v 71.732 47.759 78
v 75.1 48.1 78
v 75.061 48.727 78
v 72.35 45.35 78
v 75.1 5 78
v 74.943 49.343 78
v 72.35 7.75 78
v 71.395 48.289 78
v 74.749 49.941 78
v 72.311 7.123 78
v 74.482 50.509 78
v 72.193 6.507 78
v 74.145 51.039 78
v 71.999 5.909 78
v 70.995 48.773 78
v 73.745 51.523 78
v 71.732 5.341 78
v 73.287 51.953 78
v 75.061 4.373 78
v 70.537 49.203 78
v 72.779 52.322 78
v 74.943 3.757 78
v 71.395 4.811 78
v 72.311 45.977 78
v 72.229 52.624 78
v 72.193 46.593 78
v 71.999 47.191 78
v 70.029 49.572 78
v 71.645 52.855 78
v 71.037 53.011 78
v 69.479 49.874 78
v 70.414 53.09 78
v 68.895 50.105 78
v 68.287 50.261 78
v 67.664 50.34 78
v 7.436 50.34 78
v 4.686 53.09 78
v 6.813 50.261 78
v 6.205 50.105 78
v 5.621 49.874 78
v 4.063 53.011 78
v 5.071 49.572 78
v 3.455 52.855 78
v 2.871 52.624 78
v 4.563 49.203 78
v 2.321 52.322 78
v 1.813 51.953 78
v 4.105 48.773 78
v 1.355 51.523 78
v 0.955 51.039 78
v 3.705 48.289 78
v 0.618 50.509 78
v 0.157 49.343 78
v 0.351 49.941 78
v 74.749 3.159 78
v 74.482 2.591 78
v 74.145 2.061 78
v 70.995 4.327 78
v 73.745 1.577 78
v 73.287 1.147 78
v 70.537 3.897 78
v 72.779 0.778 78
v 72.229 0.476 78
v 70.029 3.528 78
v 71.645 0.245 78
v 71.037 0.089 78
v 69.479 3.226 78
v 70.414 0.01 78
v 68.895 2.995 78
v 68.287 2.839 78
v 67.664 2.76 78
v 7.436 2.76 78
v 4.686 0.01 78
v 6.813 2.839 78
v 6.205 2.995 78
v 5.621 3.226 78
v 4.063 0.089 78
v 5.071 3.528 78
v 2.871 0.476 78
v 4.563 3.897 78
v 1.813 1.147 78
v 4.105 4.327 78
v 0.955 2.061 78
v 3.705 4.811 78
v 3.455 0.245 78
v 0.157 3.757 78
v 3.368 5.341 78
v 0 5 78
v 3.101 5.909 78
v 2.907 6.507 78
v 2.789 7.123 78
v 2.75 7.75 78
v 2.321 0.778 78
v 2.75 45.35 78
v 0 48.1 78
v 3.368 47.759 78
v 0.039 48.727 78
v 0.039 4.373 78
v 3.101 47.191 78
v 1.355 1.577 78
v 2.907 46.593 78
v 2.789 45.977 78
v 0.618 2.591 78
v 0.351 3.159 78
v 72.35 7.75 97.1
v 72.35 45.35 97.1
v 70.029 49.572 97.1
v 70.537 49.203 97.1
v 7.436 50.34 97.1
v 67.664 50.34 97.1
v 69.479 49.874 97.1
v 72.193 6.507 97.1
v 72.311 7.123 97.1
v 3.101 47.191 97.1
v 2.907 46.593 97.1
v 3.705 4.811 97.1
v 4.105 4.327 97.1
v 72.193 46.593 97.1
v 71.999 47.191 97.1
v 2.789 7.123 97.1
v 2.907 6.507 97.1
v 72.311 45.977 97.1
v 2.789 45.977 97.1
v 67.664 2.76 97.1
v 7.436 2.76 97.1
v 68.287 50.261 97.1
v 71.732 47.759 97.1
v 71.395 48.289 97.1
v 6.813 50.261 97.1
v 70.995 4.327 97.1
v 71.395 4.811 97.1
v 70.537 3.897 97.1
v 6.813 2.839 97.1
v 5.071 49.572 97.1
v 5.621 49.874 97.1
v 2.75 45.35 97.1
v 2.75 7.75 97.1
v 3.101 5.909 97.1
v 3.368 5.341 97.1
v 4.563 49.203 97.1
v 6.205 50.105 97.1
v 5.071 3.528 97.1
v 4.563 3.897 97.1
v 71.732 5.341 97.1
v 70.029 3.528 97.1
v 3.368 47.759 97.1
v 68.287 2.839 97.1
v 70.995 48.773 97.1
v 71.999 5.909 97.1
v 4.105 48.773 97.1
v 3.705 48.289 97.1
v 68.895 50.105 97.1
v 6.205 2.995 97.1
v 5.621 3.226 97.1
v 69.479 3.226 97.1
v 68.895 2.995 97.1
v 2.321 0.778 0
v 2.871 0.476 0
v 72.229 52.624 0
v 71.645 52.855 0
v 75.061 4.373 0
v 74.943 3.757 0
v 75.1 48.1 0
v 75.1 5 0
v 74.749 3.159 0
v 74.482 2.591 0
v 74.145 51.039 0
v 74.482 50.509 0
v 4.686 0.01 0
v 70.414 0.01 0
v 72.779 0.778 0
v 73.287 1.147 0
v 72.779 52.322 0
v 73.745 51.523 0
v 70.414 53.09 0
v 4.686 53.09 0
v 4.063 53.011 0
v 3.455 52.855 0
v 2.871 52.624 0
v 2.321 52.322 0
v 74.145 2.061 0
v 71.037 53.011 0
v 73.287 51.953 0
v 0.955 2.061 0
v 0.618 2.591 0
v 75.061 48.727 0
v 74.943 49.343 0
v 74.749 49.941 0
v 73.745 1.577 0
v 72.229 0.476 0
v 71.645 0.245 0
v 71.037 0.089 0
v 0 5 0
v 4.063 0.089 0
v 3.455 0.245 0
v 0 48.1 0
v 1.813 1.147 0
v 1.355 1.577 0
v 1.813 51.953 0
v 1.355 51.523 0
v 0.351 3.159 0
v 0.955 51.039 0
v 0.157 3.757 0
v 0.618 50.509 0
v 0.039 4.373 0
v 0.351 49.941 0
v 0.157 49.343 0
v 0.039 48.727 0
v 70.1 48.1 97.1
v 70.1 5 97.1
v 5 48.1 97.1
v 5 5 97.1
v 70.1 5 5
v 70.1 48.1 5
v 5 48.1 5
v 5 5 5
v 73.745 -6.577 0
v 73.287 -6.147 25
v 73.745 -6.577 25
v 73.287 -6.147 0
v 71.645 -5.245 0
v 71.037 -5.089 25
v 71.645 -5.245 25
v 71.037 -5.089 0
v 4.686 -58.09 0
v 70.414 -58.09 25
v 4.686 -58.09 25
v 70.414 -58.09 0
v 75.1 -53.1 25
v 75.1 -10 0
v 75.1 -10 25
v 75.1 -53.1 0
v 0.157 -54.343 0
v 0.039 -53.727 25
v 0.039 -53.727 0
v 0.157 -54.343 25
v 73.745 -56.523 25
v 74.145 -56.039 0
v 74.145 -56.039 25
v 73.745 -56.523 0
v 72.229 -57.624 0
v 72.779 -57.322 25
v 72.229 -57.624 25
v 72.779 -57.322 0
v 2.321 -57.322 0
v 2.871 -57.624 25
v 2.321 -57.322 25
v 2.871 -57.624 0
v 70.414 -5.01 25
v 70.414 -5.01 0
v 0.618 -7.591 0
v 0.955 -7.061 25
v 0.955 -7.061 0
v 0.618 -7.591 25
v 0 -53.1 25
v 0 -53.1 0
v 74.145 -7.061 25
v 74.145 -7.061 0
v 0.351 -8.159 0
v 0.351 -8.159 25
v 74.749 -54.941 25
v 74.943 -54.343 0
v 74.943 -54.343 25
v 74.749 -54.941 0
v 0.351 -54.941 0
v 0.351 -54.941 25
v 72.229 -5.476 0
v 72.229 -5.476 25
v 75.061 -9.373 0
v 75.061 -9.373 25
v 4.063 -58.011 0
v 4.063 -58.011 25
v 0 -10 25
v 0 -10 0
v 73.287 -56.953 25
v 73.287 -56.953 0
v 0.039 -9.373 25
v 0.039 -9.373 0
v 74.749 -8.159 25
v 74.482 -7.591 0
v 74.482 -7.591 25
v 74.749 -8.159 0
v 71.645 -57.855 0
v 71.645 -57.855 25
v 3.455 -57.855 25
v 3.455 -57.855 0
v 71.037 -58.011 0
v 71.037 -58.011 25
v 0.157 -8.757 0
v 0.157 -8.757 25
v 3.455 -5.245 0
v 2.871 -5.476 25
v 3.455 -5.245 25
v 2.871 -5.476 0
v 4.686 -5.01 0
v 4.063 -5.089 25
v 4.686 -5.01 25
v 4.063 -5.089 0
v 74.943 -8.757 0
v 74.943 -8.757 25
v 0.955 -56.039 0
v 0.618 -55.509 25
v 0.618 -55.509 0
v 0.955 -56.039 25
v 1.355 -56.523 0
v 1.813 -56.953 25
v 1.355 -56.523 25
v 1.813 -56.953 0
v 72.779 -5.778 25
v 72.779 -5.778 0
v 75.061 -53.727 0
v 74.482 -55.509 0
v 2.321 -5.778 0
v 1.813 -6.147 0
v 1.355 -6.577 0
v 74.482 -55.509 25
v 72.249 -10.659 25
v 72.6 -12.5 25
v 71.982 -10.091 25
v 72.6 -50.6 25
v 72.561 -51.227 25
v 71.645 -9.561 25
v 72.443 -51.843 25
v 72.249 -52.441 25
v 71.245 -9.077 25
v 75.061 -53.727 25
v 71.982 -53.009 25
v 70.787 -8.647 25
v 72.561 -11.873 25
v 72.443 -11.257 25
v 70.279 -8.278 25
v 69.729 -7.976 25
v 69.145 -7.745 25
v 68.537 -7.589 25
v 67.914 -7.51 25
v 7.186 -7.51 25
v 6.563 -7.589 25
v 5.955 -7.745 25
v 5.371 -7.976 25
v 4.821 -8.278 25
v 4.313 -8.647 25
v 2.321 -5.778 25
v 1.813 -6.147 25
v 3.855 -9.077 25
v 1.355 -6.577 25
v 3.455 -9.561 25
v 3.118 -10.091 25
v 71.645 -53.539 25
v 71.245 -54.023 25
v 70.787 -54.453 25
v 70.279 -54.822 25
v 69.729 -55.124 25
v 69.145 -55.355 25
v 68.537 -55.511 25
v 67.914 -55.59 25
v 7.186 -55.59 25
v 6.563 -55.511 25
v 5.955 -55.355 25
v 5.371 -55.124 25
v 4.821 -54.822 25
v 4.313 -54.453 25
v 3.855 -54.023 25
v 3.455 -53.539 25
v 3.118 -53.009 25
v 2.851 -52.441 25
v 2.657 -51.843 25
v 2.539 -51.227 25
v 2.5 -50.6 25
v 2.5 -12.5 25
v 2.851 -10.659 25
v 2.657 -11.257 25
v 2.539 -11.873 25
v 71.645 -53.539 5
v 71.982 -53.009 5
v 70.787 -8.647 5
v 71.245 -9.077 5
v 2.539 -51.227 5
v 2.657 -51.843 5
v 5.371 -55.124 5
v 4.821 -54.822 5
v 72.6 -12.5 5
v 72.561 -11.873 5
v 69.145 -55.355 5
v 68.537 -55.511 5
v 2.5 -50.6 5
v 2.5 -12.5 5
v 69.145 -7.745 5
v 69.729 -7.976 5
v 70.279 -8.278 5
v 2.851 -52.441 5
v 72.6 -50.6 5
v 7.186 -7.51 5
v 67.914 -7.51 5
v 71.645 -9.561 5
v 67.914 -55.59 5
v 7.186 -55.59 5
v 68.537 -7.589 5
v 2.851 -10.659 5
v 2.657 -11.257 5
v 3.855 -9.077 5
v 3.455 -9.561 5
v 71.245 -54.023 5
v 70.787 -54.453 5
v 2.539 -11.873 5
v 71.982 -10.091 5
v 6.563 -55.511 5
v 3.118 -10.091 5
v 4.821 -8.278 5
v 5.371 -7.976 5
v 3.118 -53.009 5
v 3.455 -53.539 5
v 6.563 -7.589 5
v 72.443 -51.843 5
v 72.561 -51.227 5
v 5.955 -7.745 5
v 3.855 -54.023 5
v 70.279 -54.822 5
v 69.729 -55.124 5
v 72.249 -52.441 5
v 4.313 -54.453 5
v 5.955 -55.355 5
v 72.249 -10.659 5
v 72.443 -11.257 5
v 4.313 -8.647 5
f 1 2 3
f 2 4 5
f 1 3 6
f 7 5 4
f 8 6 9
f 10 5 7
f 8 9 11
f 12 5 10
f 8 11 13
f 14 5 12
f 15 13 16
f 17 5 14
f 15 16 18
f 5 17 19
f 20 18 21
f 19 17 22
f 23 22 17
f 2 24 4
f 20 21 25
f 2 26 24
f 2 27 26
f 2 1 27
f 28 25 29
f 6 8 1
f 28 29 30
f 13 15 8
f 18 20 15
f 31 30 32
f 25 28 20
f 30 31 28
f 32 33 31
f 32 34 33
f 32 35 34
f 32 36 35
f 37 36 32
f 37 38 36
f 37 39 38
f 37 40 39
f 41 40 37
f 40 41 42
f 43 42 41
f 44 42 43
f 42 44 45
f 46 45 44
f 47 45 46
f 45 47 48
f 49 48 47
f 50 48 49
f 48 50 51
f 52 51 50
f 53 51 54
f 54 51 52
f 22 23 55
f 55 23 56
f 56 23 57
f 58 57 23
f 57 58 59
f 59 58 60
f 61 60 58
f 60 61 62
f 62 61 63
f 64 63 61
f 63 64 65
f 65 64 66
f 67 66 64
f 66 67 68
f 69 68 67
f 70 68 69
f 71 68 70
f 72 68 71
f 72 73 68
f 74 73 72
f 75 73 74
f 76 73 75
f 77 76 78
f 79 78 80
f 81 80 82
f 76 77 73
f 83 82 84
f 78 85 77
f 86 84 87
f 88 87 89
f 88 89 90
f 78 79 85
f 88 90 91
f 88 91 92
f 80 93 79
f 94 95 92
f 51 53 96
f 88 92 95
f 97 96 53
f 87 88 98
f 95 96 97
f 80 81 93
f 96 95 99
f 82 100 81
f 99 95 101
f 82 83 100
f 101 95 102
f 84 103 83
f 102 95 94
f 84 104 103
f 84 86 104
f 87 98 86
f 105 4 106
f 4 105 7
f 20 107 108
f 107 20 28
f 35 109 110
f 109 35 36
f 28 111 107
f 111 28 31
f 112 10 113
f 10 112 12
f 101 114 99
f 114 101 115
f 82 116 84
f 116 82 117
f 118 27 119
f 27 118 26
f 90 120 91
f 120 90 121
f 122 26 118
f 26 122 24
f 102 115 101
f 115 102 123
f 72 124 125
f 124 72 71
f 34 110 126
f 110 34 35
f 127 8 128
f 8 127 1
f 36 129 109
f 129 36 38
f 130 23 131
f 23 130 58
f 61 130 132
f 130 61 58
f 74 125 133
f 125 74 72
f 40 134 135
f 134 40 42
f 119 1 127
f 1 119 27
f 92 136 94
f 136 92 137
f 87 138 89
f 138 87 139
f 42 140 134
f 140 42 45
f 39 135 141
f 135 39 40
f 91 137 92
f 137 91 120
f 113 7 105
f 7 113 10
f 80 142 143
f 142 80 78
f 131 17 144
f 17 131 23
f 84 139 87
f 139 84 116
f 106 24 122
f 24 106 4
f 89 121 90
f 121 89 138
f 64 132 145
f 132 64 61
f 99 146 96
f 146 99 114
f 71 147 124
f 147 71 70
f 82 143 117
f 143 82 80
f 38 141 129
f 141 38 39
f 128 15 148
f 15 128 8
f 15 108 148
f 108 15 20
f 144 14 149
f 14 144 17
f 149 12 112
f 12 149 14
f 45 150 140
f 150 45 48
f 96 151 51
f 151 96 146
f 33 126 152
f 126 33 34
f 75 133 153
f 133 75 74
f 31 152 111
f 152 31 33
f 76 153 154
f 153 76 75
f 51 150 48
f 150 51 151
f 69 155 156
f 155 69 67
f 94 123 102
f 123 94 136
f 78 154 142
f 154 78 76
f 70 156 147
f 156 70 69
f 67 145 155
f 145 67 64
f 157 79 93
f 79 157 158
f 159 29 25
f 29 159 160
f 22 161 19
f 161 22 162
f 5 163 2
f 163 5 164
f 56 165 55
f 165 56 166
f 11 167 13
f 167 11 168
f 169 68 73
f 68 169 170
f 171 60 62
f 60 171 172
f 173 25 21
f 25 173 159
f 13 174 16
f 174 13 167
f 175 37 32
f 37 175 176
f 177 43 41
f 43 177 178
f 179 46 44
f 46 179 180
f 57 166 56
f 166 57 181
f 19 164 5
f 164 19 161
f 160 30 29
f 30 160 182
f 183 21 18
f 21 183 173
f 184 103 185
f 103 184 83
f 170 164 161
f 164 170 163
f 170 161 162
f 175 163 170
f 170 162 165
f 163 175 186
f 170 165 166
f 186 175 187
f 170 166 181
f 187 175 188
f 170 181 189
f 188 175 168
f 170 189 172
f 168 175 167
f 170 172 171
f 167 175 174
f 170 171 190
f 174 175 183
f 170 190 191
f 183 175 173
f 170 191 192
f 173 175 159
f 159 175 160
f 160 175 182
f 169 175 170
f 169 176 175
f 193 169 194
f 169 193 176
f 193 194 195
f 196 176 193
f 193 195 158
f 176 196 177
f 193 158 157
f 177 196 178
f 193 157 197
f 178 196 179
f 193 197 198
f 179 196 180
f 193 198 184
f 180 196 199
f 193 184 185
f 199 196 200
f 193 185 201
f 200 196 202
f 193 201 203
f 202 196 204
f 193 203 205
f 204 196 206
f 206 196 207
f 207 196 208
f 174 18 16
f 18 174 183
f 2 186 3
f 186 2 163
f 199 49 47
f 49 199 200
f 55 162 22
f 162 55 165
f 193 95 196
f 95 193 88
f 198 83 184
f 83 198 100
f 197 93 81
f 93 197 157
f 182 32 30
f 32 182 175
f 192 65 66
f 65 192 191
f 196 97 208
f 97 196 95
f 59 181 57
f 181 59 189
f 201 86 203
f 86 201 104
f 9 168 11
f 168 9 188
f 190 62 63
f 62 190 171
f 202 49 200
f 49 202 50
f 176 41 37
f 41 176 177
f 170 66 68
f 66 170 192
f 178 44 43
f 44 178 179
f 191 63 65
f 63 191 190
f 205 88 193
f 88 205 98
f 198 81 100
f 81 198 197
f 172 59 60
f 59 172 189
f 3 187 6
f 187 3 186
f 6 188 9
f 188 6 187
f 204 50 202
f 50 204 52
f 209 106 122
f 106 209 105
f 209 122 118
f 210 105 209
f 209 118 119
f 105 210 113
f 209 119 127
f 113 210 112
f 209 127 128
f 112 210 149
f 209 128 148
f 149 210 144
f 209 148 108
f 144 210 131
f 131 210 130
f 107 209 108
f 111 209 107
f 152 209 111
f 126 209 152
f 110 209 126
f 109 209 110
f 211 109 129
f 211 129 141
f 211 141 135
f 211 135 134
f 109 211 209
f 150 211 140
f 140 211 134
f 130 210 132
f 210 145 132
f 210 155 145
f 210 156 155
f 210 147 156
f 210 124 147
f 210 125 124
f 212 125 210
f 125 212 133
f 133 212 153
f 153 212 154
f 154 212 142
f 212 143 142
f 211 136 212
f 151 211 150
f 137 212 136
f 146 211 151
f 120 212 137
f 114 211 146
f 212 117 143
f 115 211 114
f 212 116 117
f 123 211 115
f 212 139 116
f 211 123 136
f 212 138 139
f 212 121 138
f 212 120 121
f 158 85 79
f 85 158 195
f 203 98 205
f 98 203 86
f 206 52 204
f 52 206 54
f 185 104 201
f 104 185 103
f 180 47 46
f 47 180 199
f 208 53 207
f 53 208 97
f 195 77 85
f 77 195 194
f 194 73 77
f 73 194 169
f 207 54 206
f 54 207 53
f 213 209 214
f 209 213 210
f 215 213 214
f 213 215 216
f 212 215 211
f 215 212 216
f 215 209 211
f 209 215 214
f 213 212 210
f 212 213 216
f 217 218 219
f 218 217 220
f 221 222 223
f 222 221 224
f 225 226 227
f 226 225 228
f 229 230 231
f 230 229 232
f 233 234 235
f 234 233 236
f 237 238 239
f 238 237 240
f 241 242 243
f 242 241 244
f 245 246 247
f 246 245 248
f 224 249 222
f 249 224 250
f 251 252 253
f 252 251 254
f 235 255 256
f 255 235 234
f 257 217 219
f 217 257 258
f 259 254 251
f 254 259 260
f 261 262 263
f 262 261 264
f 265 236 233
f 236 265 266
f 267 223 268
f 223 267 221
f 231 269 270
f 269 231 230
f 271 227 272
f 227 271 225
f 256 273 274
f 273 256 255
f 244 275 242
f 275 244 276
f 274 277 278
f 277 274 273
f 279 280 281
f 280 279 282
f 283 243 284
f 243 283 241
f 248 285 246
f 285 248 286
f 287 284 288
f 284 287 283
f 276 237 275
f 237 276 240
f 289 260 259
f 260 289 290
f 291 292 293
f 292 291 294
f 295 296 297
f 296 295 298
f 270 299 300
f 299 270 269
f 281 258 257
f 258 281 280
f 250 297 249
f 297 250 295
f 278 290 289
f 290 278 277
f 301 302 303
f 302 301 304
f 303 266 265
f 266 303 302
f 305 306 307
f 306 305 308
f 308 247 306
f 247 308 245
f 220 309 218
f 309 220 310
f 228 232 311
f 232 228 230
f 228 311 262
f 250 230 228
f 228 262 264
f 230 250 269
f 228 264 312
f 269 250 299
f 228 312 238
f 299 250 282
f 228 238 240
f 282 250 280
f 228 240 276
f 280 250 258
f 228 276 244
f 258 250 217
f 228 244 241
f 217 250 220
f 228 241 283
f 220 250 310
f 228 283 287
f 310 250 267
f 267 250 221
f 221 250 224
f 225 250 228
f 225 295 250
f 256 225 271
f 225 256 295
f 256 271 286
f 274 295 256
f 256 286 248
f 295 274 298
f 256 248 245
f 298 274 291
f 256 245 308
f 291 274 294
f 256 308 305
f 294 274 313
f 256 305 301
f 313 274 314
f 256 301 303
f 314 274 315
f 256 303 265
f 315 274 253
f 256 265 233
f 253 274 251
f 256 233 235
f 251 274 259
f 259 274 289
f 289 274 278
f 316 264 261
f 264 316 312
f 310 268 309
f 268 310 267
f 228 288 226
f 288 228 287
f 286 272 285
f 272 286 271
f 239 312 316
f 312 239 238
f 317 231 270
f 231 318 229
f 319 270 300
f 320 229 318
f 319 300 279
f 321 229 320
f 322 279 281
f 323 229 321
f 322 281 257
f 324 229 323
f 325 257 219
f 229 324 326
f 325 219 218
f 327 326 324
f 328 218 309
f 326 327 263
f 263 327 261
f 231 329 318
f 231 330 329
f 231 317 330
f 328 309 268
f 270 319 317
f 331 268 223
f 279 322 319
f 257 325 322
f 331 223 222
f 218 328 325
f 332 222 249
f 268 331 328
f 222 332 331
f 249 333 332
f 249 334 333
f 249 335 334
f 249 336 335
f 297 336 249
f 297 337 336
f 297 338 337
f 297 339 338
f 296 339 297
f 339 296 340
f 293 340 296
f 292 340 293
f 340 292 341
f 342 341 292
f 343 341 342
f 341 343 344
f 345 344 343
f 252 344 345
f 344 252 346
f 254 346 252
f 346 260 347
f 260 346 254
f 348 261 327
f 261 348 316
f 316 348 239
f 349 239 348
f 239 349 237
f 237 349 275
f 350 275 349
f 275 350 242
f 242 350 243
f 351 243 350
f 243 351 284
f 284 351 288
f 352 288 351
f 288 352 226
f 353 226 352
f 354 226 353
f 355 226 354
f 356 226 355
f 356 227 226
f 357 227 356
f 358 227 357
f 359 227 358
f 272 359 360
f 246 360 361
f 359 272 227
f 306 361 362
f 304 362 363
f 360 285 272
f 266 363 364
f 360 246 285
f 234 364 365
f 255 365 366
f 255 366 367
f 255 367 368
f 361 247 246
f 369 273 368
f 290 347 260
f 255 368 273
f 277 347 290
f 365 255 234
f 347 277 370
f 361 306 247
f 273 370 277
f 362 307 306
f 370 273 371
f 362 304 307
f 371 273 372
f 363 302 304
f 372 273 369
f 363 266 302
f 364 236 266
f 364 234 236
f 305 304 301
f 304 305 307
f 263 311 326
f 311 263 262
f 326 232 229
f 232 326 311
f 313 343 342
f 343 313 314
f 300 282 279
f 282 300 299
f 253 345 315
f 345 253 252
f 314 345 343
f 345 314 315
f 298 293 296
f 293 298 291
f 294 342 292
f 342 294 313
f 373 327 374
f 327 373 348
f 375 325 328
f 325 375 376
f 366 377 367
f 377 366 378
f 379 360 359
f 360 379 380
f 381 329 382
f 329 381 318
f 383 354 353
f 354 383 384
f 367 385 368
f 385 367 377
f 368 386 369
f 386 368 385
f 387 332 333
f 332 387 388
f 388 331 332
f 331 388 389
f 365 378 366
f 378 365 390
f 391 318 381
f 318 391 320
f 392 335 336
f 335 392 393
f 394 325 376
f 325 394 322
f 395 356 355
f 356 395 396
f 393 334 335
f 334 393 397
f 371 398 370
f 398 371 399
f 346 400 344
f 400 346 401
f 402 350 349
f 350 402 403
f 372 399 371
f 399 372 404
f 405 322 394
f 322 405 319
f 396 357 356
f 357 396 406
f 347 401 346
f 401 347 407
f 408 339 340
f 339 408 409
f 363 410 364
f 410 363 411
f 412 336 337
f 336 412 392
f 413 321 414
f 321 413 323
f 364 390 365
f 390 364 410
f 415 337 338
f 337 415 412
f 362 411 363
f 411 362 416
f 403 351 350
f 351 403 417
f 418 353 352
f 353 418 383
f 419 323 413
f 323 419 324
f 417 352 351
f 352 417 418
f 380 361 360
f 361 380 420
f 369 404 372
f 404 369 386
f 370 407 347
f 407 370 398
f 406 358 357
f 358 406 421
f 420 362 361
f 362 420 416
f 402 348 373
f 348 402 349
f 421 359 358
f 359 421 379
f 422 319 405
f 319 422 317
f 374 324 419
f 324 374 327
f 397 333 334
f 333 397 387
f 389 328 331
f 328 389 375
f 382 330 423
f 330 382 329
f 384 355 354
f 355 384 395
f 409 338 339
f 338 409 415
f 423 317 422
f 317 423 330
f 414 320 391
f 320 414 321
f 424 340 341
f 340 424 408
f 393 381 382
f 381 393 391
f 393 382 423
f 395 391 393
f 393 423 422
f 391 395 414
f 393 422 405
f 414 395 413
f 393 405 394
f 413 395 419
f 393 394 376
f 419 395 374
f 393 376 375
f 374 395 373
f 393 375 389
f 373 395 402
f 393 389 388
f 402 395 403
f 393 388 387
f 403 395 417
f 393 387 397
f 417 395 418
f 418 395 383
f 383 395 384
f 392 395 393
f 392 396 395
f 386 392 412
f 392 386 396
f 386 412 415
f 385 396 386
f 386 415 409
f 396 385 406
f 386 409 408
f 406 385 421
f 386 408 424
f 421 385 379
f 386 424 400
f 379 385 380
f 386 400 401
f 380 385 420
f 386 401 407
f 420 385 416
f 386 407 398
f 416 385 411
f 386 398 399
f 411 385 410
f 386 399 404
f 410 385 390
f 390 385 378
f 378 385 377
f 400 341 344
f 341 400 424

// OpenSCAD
/* [Configurations] */
Object_Height = 92;
Object_Width = 65;
Object_Depth = 43;
Wall_Tickness = 5;// 5mm is good enough
Cover_Height = 25;

/* [hidden] */
$fn = 50;
Tolerance = 0.1;
Cover_Spacing = 0.5;
Rounded_Corner = 5;


caixa();
translate([0 ,-5 ,Cover_Height]) rotate([180,0,0])  tampa(0);

module caixa(){
    difference(){
    roundedcube(Object_Width + Tolerance + (Wall_Tickness * 2), Object_Depth + Tolerance + (Wall_Tickness * 2), Object_Height + Tolerance + Wall_Tickness, Rounded_Corner,Rounded_Corner,Rounded_Corner,Rounded_Corner);
    translate([Wall_Tickness, Wall_Tickness, Wall_Tickness]) cube([Object_Width + Tolerance, Object_Depth + Tolerance, Object_Height + Tolerance + 1]);
    // Recorte da tampa
    translate([0,-0,(Object_Height + 1) - Cover_Height + (Wall_Tickness * 2)]) tampa(Cover_Spacing);    
    }
    
}

module simbolo(rotation){
    union()
	{
		rotate([90,0,rotation]) resize([larguraLogo,alturaLogo,profundidadeLogo]) import("logo.stl");
	}
}

module tampa(folga){
    difference(){
    translate([-folga/2,-folga/2,0]) roundedcube(Object_Width + Tolerance + (Wall_Tickness * 2) + folga, Object_Depth + Tolerance + (Wall_Tickness * 2) + folga, Cover_Height, Rounded_Corner,Rounded_Corner,Rounded_Corner,Rounded_Corner);
    translate([(Wall_Tickness + folga)/2, (Wall_Tickness + folga) /2, -Wall_Tickness]) roundedcube(Object_Width + Tolerance + Wall_Tickness - folga, Object_Depth + Tolerance +Wall_Tickness - folga, Cover_Height , Rounded_Corner, Rounded_Corner, Rounded_Corner, Rounded_Corner);
    }
}

module cartas(){
#cube([Object_Width, Object_Depth, Object_Height]);
}

module roundedcube(xdim ,ydim ,zdim,rdim1, rdim2, rdim3, rdim4){
    hull(){
        translate([rdim1,rdim1,0]) cylinder(r=rdim1, h=zdim);
        translate([xdim-rdim2,rdim2,0]) cylinder(r=rdim2, h=zdim);

        translate([rdim3,ydim-rdim3,0]) cylinder(r=rdim3, h=zdim);
        translate([xdim-rdim4,ydim-rdim4,0]) cylinder(r=rdim4, h=zdim);
    }
}
